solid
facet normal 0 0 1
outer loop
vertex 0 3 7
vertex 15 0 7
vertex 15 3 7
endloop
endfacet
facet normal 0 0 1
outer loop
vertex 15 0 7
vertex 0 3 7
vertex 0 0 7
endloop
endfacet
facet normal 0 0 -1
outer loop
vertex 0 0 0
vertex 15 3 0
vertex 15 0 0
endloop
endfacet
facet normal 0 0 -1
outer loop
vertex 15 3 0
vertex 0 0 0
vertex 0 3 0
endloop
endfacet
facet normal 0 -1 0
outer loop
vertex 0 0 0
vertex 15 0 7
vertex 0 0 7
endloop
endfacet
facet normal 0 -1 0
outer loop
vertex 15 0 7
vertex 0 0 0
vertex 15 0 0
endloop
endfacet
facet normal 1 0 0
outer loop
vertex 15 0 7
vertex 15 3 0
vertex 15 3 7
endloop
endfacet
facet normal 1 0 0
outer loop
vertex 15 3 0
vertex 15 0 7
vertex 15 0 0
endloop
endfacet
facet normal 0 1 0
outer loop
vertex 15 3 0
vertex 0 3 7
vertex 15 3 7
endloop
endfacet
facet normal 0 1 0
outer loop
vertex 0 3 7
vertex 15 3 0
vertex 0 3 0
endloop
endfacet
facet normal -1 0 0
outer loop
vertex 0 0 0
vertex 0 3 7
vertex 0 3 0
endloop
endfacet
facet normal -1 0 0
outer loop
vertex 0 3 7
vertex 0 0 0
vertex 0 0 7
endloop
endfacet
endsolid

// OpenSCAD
// Generated by SolidPython 1.0.1 on 2020-07-29 00:46:55


cube(size = [15, 3, 7]);
/***********************************************
*********      SolidPython code:      **********
************************************************
 
# import packages: SolidPython
from solid import *
from solid.utils import *
from itertools import chain, combinations, permutations


class Resize:

    def __init__(self, scad_file):
        self.scad_file = scad_file
        #self.scad_file = import_scad(scad_file)
        # cone/cylinder param:
        self.r1 = 0
        self.r2 = 0
        self.h = 0
        # rectangular prism param:
        self.w = 0
        self.l = 0
        # ellipse param:
        self.r = 0

    # import OpenScad code (file name corresponds to shape)


    # classify shape + parameters
    def assign(self, param1, param2, param3):
        if self.scad_file == 'cone.scad':
            self.r1 = param1
            self.r2 = param2
            self.h = param3
        elif self.scad_file == 'cylinder.scad':
            self.r1 = param1
            self.r2 = param2
            self.h = param3
        elif self.scad_file == 'rectangularPrism.scad':
            self.h = param1
            self.l = param2
            self.w = param3
        else:
            self.r = param1
            self.h = param2

    # resize parameters
    def iterate(self):
        x = range(3, 20, 2)
        i = 1
        if self.scad_file == 'cone.scad':
            tempList = list(permutations(x, 2))
            for temp in tempList:
                param1 = temp[0]
                param2 = temp[1]
                filepath = 'produced_scad_files/' + 'cone' + str(param1) + '_' + str(param2) + '_' + '.scad'
                scad_render_to_file(cylinder(h=param1, r1=param2, r2=0), filepath)

        elif self.scad_file == 'cylinder.scad':
            tempList = list(permutations(x, 3))
            for temp in tempList:
                param1 = temp[0]
                param2 = temp[1]
                filepath = 'produced_scad_files/' + 'cylinder' + str(param1) + '_' + str(param2) + '_' + '.scad'
                scad_render_to_file(cylinder(h=param1, r1=param2, r2=param2), filepath)

        elif self.scad_file == 'rectangularPrism.scad':
            tempList = list(permutations(x, 3))
            for temp in tempList:
                param1 = temp[0]
                param2 = temp[1]
                param3 = temp[2]
                filepath = 'produced_scad_files/' + 'rectangularPrism' + str(param1) + '_' + str(param2) + '_' + str(
                    param3) + '.scad'
                scad_render_to_file(cube(size=(param1, param2, param3)), filepath)

        elif self.scad_file == 'ellipse.scad':
            tempList = list(permutations(x, 4))
            for temp in tempList:
                param1 = temp[0]
                param2 = temp[1]
                param3 = temp[2]
                param4 = temp[3]
                filepath = 'produced_scad_files/' + 'ellipse' + str(param1) + '_' + str(param2) + '_' + str(param3) + '_' + str(param4) + '.scad'
                scad_render_to_file(scale([param1, param2, param3])(sphere(r=param4)), filepath)

    def render_to_scadfile(self):
        scad_render_to_file(scad, 'example.scad') 
 
************************************************/
